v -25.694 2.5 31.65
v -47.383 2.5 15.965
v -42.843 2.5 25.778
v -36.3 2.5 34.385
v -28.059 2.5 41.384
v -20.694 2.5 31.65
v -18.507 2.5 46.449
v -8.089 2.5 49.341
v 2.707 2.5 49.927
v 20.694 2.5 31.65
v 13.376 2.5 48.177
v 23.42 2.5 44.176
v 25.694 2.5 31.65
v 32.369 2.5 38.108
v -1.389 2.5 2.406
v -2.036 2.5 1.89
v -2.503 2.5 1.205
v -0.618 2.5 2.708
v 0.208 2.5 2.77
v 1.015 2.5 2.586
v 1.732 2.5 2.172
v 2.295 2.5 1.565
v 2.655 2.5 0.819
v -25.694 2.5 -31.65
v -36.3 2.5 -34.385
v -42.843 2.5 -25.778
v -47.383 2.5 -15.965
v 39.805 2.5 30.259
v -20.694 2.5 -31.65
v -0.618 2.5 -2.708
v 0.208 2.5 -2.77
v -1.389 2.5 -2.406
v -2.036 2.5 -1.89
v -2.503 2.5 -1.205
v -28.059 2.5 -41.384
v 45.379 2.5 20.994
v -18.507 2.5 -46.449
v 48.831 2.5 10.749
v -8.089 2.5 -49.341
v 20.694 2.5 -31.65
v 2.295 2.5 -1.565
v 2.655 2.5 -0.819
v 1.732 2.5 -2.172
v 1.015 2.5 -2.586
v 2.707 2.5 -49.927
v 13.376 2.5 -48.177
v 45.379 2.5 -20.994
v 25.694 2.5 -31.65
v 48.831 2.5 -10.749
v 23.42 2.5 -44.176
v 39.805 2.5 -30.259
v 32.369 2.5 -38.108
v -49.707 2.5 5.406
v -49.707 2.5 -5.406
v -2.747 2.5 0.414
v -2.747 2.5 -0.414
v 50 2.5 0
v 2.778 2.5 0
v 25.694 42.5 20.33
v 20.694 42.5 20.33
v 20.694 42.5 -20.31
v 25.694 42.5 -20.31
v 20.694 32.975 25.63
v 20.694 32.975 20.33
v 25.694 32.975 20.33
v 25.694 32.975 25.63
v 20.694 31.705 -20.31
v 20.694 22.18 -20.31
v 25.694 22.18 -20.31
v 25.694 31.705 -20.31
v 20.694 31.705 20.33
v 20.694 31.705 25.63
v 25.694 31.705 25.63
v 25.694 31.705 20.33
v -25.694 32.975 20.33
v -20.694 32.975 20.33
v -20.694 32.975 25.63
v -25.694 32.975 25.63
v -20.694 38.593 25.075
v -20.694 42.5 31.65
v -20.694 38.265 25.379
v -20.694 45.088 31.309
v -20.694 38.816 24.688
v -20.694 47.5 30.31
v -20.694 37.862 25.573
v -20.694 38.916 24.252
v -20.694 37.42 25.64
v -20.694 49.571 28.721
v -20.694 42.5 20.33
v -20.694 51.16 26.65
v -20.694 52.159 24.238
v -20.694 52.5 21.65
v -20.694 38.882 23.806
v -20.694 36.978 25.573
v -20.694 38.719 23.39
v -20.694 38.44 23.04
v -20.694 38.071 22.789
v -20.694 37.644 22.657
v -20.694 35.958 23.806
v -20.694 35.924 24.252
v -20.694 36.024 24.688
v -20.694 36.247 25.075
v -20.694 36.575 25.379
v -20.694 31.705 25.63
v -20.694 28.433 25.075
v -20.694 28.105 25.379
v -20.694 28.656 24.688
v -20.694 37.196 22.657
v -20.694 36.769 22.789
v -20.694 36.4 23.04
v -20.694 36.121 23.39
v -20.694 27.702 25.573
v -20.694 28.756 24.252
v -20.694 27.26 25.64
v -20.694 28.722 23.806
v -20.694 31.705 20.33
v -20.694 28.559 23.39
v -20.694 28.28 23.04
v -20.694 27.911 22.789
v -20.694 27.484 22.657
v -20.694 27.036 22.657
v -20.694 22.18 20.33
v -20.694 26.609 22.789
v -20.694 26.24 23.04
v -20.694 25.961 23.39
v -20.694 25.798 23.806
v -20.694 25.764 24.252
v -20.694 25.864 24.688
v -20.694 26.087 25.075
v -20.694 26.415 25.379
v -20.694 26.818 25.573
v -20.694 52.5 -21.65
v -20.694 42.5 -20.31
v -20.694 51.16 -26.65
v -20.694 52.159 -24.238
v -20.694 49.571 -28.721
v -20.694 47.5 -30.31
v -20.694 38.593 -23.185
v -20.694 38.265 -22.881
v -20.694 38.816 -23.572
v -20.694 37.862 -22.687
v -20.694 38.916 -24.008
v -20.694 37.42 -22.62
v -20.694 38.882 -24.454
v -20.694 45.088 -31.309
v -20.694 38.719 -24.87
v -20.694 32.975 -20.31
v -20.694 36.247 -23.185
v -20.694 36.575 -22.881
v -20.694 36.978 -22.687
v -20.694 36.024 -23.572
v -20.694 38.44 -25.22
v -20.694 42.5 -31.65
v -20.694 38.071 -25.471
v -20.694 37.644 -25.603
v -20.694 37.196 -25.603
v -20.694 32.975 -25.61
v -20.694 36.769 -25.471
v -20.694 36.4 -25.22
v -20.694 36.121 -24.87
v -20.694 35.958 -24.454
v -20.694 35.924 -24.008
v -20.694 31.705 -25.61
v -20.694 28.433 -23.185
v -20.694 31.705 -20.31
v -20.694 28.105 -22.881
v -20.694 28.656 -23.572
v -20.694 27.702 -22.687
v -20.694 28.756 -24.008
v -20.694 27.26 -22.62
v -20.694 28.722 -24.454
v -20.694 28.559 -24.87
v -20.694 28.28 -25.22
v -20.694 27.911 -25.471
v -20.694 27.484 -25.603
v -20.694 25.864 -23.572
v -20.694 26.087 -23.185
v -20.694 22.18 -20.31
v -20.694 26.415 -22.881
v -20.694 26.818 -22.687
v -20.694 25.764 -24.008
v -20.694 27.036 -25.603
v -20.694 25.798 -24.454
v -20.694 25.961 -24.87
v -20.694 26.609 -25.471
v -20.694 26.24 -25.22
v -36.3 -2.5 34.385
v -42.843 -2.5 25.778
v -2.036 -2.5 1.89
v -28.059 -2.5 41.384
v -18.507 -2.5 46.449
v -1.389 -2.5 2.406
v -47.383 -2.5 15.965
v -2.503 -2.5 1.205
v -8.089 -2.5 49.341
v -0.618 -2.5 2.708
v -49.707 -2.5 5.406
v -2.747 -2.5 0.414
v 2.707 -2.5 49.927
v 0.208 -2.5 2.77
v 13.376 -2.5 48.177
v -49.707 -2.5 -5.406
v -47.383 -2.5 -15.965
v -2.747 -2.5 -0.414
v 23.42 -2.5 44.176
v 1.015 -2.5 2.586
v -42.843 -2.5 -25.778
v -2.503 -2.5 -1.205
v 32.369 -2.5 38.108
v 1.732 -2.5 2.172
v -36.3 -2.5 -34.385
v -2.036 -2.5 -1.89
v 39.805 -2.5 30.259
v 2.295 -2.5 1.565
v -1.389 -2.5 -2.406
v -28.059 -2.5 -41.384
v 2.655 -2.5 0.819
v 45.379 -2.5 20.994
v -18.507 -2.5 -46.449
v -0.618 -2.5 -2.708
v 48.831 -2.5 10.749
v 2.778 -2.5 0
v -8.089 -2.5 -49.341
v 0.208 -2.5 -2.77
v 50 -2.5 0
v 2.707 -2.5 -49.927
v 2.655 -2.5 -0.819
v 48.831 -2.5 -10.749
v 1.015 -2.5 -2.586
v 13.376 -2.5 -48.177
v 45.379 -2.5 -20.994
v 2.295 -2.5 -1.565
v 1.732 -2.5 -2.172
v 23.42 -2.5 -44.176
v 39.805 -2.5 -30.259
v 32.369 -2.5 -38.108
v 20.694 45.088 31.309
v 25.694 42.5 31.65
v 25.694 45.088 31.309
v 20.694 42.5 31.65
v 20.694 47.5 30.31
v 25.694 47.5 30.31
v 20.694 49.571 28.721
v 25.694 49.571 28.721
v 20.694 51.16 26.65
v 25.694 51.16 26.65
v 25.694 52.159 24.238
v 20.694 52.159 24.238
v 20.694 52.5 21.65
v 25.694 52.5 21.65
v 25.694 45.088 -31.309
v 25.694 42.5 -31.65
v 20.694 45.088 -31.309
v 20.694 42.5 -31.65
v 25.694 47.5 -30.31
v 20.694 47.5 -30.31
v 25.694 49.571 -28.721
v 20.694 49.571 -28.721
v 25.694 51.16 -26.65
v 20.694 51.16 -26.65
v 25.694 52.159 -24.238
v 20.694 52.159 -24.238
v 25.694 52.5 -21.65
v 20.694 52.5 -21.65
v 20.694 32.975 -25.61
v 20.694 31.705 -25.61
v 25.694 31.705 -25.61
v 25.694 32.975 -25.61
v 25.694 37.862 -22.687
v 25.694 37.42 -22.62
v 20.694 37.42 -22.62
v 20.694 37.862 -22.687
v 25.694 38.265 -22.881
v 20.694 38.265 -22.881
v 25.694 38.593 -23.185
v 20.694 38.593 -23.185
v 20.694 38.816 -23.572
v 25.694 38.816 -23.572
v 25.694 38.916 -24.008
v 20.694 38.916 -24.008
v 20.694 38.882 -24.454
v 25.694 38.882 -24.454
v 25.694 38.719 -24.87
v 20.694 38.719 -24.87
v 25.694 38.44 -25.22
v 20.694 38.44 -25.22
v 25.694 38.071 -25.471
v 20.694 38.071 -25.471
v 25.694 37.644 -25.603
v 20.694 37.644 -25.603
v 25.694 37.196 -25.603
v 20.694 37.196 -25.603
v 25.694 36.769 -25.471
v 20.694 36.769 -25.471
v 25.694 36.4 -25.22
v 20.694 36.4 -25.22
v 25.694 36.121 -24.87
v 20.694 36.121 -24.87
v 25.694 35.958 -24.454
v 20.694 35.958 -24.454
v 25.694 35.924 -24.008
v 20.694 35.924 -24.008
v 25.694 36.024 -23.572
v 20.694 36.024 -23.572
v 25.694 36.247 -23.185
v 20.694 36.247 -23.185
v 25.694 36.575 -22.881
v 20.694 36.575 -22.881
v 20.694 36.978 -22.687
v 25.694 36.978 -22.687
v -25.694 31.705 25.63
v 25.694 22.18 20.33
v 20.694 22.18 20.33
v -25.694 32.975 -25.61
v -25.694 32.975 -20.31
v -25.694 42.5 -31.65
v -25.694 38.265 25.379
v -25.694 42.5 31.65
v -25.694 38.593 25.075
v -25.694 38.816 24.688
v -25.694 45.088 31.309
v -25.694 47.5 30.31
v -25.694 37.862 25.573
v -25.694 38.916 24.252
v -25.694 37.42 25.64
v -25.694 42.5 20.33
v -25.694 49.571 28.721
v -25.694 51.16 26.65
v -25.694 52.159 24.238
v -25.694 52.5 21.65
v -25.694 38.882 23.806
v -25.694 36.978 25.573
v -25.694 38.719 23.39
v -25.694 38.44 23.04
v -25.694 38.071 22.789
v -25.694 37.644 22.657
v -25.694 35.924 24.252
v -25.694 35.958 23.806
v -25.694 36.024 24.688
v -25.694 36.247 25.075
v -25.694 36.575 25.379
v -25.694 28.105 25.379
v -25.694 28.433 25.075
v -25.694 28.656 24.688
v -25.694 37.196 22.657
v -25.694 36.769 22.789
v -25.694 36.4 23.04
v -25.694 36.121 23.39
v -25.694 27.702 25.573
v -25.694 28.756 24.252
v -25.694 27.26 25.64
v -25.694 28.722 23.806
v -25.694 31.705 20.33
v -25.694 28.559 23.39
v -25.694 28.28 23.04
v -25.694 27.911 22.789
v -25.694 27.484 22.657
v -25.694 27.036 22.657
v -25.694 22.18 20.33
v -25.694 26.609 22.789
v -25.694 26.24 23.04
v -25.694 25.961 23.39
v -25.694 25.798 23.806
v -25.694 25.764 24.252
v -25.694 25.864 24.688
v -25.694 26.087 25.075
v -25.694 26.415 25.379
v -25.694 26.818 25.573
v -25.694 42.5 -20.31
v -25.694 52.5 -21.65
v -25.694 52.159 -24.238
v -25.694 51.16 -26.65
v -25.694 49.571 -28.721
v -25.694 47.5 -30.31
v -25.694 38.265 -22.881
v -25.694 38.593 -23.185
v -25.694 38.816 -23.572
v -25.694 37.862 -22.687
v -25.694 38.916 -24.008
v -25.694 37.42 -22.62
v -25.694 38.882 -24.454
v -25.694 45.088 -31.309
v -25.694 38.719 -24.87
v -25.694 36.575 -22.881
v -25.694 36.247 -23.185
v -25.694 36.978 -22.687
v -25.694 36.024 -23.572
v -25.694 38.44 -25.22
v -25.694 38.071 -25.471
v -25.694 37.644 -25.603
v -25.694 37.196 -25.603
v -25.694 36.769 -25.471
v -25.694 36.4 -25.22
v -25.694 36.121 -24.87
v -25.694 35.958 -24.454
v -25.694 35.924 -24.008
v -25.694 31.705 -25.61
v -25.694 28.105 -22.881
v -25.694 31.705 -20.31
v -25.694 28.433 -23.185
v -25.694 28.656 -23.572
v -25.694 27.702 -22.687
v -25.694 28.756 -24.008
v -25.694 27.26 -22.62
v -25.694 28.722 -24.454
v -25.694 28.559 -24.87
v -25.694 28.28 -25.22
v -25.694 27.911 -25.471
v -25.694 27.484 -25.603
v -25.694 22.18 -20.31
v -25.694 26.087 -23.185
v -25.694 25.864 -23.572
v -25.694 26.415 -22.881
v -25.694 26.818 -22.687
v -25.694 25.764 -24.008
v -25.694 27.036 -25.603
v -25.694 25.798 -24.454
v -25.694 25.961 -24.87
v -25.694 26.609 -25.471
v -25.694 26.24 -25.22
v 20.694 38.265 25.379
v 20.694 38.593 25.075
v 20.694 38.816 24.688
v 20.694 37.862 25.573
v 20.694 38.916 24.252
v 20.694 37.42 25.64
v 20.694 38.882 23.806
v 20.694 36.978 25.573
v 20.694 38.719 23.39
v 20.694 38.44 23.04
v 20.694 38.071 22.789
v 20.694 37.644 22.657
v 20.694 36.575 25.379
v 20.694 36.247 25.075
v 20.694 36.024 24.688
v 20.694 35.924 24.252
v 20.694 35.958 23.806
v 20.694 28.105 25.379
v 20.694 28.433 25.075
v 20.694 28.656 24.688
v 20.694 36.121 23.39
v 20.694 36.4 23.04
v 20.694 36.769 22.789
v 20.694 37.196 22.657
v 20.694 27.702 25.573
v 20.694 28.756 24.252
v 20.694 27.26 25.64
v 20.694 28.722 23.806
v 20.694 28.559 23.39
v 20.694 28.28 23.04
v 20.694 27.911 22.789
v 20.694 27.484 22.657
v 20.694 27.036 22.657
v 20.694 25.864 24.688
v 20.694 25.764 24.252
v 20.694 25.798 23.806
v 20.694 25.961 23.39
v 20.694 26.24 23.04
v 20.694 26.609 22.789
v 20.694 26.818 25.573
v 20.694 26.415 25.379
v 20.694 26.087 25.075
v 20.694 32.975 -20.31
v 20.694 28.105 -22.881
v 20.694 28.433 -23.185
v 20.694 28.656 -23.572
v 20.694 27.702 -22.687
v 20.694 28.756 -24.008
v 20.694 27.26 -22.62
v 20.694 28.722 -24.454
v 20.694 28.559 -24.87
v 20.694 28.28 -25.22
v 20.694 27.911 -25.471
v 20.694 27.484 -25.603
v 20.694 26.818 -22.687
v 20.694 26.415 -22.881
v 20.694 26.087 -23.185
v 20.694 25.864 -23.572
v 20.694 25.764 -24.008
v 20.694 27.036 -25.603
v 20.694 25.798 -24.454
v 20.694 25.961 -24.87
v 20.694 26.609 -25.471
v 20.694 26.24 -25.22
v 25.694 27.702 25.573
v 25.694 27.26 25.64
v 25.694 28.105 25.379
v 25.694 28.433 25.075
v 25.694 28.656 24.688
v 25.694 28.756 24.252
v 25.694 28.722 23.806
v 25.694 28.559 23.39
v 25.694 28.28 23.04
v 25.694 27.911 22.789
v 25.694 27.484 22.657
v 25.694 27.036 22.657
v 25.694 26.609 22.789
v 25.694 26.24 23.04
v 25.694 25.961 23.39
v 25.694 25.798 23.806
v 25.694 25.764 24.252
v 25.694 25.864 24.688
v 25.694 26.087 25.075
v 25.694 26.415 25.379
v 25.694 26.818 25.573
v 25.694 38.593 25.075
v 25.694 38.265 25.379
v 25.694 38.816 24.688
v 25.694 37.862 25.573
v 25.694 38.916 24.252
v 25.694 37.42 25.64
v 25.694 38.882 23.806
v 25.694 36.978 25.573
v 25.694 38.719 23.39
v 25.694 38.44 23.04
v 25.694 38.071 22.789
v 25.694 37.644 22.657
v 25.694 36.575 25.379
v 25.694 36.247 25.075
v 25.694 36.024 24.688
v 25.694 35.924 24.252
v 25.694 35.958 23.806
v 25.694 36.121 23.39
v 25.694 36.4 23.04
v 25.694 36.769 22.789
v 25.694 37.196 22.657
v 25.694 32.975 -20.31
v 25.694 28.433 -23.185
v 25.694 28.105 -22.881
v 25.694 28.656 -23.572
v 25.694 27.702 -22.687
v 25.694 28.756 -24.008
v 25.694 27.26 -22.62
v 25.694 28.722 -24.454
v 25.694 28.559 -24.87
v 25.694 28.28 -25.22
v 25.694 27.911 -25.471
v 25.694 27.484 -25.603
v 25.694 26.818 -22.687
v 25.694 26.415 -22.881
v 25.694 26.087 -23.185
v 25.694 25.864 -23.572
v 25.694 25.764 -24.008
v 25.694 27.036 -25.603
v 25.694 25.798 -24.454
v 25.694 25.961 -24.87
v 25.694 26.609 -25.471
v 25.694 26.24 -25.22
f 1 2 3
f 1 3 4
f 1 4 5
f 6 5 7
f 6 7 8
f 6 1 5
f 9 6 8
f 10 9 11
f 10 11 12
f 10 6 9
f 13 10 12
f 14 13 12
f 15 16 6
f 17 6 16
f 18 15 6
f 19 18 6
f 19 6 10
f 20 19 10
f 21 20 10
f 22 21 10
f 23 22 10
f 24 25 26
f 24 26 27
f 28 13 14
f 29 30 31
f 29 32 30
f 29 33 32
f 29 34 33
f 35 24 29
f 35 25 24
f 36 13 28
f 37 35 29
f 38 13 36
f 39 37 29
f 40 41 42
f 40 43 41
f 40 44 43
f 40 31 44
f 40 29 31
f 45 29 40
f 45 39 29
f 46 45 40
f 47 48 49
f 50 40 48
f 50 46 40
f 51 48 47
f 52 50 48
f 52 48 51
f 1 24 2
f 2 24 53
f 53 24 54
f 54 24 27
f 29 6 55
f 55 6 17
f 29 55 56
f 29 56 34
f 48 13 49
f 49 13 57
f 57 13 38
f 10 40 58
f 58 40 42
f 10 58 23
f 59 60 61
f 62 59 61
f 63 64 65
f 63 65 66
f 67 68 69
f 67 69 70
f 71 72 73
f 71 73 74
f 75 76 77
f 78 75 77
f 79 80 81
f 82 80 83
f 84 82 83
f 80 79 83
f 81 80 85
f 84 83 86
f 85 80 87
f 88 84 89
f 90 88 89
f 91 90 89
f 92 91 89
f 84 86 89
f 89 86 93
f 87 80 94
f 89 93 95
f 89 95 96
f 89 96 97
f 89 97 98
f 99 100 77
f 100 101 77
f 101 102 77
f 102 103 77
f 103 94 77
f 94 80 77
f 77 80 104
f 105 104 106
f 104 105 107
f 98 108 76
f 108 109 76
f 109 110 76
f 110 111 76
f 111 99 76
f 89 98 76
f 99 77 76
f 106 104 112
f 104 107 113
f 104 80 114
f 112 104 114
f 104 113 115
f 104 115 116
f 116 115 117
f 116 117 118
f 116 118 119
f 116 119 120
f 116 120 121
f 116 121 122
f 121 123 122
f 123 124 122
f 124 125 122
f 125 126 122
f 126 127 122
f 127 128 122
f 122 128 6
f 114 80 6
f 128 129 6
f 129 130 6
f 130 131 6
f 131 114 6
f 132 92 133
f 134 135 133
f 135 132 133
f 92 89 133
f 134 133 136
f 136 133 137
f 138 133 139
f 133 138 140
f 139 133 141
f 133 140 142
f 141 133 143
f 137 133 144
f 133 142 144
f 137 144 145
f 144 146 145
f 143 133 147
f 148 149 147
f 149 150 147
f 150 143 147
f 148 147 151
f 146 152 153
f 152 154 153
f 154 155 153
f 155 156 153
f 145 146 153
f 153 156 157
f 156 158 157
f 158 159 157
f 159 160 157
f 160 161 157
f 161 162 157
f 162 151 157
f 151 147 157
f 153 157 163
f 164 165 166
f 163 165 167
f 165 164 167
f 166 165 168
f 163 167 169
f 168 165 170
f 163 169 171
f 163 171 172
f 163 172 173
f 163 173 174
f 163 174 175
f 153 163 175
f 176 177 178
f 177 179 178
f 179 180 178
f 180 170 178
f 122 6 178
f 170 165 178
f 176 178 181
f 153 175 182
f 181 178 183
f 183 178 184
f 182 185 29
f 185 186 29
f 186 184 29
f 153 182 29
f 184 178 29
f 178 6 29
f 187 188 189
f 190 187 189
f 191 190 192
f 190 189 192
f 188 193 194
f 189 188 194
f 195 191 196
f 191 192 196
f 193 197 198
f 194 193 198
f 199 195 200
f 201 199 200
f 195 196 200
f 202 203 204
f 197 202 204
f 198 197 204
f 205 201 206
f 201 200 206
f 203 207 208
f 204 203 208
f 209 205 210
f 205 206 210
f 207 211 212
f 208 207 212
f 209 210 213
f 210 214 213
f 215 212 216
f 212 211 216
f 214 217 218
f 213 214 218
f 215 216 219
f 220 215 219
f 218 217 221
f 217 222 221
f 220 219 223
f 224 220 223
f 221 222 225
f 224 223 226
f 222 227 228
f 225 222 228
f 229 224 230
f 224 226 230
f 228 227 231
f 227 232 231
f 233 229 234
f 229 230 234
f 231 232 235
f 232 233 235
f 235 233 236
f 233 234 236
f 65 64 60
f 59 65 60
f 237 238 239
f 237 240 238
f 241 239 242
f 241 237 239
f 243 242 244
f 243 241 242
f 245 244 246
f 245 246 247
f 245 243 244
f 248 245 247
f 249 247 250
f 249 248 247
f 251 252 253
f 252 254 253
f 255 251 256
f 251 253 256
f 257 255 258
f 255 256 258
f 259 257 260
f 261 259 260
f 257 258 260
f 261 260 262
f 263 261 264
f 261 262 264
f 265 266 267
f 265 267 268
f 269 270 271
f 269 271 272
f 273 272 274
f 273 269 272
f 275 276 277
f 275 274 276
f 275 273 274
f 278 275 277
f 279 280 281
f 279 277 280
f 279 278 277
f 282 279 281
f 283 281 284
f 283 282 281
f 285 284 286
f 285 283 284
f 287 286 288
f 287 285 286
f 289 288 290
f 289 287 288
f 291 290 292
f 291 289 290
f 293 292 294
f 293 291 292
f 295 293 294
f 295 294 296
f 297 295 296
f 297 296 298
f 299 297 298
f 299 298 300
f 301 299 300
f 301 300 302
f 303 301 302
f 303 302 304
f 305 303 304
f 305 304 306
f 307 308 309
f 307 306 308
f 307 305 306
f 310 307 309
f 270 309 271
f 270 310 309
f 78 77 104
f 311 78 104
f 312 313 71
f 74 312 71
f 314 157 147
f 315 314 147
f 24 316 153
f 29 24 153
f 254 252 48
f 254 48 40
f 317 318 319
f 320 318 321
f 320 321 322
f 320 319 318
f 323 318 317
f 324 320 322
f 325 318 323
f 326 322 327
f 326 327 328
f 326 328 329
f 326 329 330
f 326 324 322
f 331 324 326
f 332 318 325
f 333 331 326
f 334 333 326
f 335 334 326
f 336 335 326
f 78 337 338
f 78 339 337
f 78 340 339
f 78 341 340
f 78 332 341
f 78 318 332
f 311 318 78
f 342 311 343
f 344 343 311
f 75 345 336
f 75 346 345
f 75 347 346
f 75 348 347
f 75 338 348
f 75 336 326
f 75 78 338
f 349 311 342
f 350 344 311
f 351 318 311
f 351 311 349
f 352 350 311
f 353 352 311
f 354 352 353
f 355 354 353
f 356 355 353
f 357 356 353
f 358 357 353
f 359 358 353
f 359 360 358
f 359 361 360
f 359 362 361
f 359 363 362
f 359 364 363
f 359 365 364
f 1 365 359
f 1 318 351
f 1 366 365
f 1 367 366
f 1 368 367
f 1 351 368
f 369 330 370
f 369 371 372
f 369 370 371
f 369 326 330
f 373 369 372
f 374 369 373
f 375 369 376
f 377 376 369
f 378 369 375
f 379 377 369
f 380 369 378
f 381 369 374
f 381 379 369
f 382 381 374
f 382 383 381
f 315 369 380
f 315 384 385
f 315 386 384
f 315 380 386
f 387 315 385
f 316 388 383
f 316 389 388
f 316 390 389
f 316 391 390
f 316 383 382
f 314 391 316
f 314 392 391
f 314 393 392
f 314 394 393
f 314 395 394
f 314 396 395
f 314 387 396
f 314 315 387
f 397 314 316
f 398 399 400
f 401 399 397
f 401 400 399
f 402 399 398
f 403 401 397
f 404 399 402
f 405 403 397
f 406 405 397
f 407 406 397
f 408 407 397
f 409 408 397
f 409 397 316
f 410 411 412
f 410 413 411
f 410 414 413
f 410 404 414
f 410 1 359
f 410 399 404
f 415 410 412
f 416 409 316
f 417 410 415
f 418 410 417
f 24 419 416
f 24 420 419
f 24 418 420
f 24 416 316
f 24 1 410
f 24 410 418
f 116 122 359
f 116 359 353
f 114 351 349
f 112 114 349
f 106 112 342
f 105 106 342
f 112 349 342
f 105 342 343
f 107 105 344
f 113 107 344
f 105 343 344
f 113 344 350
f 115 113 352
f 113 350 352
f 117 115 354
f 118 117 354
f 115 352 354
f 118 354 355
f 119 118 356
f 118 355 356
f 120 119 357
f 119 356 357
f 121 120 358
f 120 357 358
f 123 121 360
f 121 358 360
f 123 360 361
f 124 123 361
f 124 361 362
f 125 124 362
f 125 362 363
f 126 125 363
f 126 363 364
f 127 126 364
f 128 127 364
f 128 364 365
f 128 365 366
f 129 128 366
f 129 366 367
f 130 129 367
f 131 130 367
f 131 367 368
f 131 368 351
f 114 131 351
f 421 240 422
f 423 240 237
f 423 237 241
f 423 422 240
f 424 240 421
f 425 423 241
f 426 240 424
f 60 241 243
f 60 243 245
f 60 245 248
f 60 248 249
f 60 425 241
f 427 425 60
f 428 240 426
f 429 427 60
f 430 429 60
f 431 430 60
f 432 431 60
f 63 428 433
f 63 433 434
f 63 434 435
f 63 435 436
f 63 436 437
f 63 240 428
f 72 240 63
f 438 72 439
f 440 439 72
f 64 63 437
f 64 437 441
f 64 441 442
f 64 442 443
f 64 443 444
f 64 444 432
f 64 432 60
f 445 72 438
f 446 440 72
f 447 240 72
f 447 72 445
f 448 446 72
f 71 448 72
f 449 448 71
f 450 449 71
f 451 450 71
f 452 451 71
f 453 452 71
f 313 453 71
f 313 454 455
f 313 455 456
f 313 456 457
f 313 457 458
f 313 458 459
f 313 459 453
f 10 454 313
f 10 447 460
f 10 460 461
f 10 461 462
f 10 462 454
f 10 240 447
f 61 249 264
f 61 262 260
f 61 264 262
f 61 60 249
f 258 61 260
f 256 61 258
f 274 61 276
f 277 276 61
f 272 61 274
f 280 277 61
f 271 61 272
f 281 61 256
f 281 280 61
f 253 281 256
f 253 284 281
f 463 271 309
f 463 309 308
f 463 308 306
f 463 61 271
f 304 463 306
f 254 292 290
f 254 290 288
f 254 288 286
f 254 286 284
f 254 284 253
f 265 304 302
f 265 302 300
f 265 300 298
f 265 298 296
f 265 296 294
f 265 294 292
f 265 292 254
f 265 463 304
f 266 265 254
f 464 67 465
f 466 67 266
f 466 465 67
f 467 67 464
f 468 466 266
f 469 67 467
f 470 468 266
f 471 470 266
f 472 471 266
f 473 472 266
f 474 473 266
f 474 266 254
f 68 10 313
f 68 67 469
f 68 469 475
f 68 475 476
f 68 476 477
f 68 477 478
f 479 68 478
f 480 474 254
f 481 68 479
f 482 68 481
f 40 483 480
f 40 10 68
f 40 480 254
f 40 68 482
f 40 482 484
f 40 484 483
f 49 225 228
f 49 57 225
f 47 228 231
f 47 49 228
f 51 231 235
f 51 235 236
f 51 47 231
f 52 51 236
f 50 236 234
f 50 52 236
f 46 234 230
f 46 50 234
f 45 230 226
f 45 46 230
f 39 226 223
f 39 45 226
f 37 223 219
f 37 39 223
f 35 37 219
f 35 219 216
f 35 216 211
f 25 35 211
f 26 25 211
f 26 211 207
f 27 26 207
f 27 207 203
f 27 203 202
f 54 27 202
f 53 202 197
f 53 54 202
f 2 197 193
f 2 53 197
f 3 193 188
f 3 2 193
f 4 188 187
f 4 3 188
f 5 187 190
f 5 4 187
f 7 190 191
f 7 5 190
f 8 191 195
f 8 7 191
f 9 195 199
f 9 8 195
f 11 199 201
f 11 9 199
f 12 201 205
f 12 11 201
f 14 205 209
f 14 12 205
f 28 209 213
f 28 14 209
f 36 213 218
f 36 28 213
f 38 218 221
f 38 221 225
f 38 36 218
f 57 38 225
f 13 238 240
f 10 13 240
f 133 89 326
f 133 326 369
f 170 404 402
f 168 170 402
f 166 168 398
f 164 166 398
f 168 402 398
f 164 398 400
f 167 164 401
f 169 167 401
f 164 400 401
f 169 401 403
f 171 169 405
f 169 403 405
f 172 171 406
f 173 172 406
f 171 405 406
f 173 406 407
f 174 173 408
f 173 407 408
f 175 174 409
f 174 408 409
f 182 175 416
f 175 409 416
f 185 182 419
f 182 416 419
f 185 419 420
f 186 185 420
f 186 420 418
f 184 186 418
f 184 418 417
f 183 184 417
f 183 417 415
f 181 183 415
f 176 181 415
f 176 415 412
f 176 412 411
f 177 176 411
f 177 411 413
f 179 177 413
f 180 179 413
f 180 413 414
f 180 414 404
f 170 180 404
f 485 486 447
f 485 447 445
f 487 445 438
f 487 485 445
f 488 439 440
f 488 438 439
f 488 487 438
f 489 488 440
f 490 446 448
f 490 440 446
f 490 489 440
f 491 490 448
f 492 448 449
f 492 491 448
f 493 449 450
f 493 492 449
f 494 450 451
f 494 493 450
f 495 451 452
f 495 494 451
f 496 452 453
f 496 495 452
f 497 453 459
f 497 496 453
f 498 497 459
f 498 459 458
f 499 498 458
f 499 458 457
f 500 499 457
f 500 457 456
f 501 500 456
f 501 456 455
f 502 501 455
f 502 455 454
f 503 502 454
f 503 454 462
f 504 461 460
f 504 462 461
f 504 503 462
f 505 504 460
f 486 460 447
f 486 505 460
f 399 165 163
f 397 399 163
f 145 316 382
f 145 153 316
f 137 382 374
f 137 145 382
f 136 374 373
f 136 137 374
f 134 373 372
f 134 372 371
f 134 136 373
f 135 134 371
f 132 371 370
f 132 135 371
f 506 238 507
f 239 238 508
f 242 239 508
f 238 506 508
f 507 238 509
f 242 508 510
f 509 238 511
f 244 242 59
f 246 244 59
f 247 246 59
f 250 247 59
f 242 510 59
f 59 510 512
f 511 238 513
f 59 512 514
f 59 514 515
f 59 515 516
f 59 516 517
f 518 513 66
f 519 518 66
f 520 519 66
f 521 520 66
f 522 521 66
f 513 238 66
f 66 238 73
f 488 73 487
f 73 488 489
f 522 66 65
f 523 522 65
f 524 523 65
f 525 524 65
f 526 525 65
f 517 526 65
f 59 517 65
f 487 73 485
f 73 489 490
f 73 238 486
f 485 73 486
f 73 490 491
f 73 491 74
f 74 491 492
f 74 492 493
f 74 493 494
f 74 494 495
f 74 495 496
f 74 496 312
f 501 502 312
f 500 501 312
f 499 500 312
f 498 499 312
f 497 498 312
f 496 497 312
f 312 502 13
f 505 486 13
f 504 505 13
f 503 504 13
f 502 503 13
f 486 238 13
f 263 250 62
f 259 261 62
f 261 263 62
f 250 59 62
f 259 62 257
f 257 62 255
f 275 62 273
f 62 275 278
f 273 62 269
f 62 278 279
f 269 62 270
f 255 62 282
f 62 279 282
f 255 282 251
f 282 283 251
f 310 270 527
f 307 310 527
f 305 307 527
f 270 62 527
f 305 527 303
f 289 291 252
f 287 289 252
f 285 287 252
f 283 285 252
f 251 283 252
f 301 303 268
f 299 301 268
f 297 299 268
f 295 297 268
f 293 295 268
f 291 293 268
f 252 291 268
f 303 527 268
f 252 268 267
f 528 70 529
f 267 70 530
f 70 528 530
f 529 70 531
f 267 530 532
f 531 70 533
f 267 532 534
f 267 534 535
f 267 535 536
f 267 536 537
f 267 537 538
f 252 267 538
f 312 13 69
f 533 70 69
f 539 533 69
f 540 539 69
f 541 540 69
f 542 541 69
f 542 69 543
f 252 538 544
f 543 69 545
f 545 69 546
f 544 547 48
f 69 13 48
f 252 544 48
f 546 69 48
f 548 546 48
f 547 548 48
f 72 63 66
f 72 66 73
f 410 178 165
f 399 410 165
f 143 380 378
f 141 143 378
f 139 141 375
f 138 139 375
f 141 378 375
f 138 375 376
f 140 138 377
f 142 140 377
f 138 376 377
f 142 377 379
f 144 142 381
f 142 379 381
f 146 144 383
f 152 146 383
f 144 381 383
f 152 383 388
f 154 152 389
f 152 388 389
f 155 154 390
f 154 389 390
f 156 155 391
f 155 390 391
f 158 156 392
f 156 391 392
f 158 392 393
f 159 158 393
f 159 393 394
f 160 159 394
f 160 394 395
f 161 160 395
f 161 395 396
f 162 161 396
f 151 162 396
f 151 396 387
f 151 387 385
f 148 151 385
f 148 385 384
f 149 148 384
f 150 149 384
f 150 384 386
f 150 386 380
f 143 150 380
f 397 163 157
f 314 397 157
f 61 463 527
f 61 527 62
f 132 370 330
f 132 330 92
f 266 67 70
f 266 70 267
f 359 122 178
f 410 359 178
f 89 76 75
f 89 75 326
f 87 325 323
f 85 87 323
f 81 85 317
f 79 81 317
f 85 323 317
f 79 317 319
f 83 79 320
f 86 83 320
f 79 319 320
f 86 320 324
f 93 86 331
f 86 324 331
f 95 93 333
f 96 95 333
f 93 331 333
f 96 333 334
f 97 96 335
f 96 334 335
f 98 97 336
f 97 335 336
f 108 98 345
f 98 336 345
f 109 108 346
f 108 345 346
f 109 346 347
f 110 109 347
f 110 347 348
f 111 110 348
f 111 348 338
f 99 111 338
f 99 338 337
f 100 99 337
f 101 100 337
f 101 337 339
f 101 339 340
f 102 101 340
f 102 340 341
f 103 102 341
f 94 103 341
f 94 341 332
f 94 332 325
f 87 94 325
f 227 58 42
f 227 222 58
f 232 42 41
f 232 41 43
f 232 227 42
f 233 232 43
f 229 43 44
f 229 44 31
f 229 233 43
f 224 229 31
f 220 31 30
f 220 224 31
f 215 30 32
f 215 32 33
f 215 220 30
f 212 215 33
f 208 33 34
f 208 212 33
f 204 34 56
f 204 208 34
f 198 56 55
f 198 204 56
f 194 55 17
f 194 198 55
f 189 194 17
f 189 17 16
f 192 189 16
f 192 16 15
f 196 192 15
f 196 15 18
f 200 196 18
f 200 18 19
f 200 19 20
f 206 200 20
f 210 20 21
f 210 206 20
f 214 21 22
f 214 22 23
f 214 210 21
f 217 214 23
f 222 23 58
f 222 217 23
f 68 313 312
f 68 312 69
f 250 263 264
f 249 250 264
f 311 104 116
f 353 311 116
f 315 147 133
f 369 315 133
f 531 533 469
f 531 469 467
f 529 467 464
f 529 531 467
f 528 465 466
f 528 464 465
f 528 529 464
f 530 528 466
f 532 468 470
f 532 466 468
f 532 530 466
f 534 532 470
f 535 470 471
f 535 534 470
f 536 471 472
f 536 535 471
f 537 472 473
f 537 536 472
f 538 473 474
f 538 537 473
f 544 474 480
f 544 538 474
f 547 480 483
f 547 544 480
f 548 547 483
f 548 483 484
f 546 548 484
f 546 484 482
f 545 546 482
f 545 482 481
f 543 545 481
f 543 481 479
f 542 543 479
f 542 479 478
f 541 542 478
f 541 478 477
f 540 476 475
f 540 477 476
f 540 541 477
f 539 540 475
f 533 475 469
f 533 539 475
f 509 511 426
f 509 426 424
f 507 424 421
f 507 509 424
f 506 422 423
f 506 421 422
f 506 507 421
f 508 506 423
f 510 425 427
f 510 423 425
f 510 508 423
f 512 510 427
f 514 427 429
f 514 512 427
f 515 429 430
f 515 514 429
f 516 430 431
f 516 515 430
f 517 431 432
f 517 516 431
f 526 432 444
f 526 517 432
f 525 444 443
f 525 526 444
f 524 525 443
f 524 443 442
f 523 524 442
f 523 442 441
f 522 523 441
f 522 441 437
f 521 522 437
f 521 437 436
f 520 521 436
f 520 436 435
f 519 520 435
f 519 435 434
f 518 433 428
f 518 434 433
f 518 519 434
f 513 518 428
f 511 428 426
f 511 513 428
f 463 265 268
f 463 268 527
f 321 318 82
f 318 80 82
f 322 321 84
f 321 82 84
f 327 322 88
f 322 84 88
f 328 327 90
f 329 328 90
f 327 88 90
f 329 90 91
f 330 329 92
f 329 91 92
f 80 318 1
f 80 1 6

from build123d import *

# Parameters (mm, degrees)
SKETCH1_R                = 50
SKETCH1_R_2              = 2.778
BOSS_EXTRUDE1_DEPTH      = 2.5
SKETCH2_W                = 5
SKETCH2_H                = 63.3
BOSS_EXTRUDE2_DEPTH      = 50
FILLET1_R                = 10
SKETCH14_W               = 40.64
SKETCH14_H               = 20.32
CUT_EXTRUDE1_DEPTH       = 30.305745908
F_3_0_3_DIAMETER_HOLE1_D = 3
FILLET1_OF_MIRROR1_R     = 10


with BuildPart() as part:
    # Sketch1 → Boss-Extrude1 (new body, symmetric)
    with BuildSketch(Plane(origin=(0, 0, 0), x_dir=(1, 0, 0), z_dir=(0, 1, 0))):
        Circle(SKETCH1_R)
        Circle(SKETCH1_R_2, mode=Mode.SUBTRACT)
    extrude(amount=BOSS_EXTRUDE1_DEPTH, both=True)

    # Sketch2 → Boss-Extrude2 (add)
    with BuildSketch(Plane(origin=(0, 2.5, 0), x_dir=(1, 0, 0), z_dir=(0, 1, 0))):
        with Locations((-23.194254092, 0)):
            Rectangle(SKETCH2_W, SKETCH2_H)
    boss_extrude2 = extrude(amount=BOSS_EXTRUDE2_DEPTH)

    # Fillet1
    fillet1_edges = [part.edges().sort_by_distance(p)[0] for p in [
        (-23.194254092, 52.5, -31.65),
        (-23.194254092, 52.5, 31.65),
    ]]
    fillet(fillet1_edges, radius=FILLET1_R)

    # Sketch14 → Cut-Extrude1 (cut, through all)
    with BuildSketch(Plane(origin=(-20.694254092, 0, 0), x_dir=(0, 0, -1), z_dir=(1, 0, 0))):
        with Locations((-0.01, 32.34)):
            Rectangle(SKETCH14_W, SKETCH14_H)
        Polygon((-20.33, 31.705), (-20.33, 32.975), (-25.63, 32.975), (-25.63, 32.34), (-25.63, 31.705), align=None)
        Polygon((25.61, 32.975), (20.31, 32.975), (20.31, 31.705), (25.61, 31.705), (25.61, 32.34), align=None)
    cut_extrude1 = extrude(amount=-CUT_EXTRUDE1_DEPTH, mode=Mode.SUBTRACT)

    # Ø3.0 (3) Diameter Hole1 (through all)
    with Locations(Plane(origin=(-20.694254092, 0, 0), x_dir=(0, 0, -1), z_dir=(1, 0, 0))):
        with Locations((24.12, 37.42), (24.12, 27.26), (-24.14, 37.42), (-24.14, 27.26)):
            f_3_0_3_diameter_hole1 = Hole(F_3_0_3_DIAMETER_HOLE1_D / 2)

    # Mirror1: Boss-Extrude2, Cut-Extrude1, Ø3.0 (3) Diameter Hole1 across plane
    add(boss_extrude2.mirror(Plane(origin=(0, 0, 0), x_dir=(0, 0, 1), z_dir=(1, 0, 0))))
    add(cut_extrude1.mirror(Plane(origin=(0, 0, 0), x_dir=(0, 0, 1), z_dir=(1, 0, 0))), mode=Mode.SUBTRACT)
    add(f_3_0_3_diameter_hole1.mirror(Plane(origin=(0, 0, 0), x_dir=(0, 0, 1), z_dir=(1, 0, 0))), mode=Mode.SUBTRACT)

    # Fillet1 of Mirror1
    fillet1_of_mirror1_edges = [part.edges().sort_by_distance(p)[0] for p in [
        (23.194254092, 52.5, -31.65),
        (23.194254092, 52.5, 31.65),
    ]]
    fillet(fillet1_of_mirror1_edges, radius=FILLET1_OF_MIRROR1_R)


solid = part.part
